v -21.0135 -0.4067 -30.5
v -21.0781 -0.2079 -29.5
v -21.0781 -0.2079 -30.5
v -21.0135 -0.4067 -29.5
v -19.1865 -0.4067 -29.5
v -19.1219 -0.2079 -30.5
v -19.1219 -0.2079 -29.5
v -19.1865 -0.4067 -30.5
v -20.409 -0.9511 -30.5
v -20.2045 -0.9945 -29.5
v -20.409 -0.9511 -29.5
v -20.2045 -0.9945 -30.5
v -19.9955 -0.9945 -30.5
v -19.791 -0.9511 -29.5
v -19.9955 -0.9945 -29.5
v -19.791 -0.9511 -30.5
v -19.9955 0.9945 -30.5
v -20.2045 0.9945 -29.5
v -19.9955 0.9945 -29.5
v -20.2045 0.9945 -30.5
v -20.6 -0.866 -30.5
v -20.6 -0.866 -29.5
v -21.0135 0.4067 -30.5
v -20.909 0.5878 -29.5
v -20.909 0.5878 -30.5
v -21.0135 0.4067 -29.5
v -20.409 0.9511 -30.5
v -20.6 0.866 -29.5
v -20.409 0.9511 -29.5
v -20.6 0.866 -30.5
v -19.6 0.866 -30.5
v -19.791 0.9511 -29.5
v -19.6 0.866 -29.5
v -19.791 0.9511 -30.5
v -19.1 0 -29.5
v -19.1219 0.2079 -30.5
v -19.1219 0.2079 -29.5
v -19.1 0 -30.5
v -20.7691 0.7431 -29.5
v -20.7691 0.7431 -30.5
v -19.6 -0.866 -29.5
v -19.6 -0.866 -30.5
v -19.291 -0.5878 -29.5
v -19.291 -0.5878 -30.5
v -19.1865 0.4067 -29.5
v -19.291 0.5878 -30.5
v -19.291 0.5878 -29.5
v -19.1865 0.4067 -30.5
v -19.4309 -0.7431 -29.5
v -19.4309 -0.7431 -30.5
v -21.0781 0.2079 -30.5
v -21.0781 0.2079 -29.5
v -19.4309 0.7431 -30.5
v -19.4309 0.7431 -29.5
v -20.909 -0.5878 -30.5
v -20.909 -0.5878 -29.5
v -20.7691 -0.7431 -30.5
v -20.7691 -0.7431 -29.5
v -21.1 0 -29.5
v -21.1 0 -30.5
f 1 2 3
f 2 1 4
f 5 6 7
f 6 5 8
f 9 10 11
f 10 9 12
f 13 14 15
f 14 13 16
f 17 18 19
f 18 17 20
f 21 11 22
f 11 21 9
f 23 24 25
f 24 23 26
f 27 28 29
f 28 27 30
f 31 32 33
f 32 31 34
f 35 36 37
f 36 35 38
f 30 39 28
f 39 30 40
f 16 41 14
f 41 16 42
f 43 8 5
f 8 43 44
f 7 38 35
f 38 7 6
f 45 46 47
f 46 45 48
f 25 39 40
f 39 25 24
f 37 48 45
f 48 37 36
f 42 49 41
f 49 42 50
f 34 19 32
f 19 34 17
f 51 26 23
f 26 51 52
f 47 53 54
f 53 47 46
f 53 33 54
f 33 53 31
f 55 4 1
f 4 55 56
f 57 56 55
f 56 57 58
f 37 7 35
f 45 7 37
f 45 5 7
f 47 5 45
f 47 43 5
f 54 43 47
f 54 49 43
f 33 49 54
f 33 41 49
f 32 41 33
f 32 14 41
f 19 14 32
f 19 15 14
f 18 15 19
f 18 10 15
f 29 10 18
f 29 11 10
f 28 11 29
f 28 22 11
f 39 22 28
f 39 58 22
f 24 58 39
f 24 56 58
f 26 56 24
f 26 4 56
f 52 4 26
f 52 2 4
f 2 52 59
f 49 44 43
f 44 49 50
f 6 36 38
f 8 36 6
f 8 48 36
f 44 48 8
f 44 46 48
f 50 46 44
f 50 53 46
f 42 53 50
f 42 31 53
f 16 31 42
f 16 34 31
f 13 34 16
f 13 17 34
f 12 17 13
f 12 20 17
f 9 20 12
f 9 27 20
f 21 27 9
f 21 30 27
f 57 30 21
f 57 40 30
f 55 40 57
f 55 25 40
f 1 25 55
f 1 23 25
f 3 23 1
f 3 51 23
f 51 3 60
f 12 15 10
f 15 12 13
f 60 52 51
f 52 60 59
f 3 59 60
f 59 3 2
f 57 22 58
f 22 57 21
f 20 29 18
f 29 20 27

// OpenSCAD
// file: IKEA Skadis v2 hook cutouts.scad
skadis_hook_width = 4.5;
skadis_hook_height = 46;
skadis_hole_spacing_width = 40; // middle to middle
cutout_tolerance_w = 0.4;
cutout_tolerance_h = 0.6;


module skadis_hook_cutout(center=false, hook_count=2) {
    
    if(center) {
        translate([-(skadis_hole_spacing_width + skadis_hook_width) / 2, 0, - skadis_hook_height / 2])
        object(hook_count);
    } else {
        object();
    }
    

}

module object(hook_count=2) {
    union() {

        // Cutout for the hook 1
        color("red")
        translate([- cutout_tolerance_w / 2, 0, - cutout_tolerance_h / 2])
        cube([skadis_hook_width + cutout_tolerance_w, 2, skadis_hook_height + cutout_tolerance_h]);

        // Cutout for the hook 2
        color("red")
        translate([- cutout_tolerance_w / 2 + skadis_hole_spacing_width, 0, - cutout_tolerance_h / 2])
        cube([skadis_hook_width + cutout_tolerance_w, 2, skadis_hook_height + cutout_tolerance_h]);

    }
}

skadis_hook_cutout(center = false);
// file: ../modules/roundedcube.scad
// More information: https://danielupshaw.com/openscad-rounded-corners/


// Examples
// color("Yellow")
// roundedcube(3, true, 0.7, "xmin");

// translate(v = [1, 0, 2])
// color("Pink")
// roundedcube([4, 2, 2], false, 0.6, "zmax");

// translate(v = [-4, -1, 2])
// color("Lightblue")
// roundedcube(2, false);

// translate(v = [0, 0, 6])
// color("Orange")
// roundedcube([3, 2, 2], true, 0.2);

// translate(v = [2.5, -0.5, 5])
// color("Green")
// roundedcube([3, 2, 2], false, 0.4, "z");

// Set to 0.01 for higher definition curves (renders slower)
$fs = 0.15;

module roundedcube(size = [1, 1, 1], center = false, radius = 0.5, apply_to = "all") {
	// If single value, convert to [x, y, z] vector
	size = (size[0] == undef) ? [size, size, size] : size;

	translate_min = radius;
	translate_xmax = size[0] - radius;
	translate_ymax = size[1] - radius;
	translate_zmax = size[2] - radius;

	diameter = radius * 2;

	obj_translate = (center == false) ?
		[0, 0, 0] : [
			-(size[0] / 2),
			-(size[1] / 2),
			-(size[2] / 2)
		];

	translate(v = obj_translate) {
		hull() {
			for (translate_x = [translate_min, translate_xmax]) {
				x_at = (translate_x == translate_min) ? "min" : "max";
				for (translate_y = [translate_min, translate_ymax]) {
					y_at = (translate_y == translate_min) ? "min" : "max";
					for (translate_z = [translate_min, translate_zmax]) {
						z_at = (translate_z == translate_min) ? "min" : "max";

						translate(v = [translate_x, translate_y, translate_z])
						if (
							(apply_to == "all") ||
							(apply_to == "xmin" && x_at == "min") || (apply_to == "xmax" && x_at == "max") ||
							(apply_to == "ymin" && y_at == "min") || (apply_to == "ymax" && y_at == "max") ||
							(apply_to == "zmin" && z_at == "min") || (apply_to == "zmax" && z_at == "max")
						) {
							sphere(r = radius);
						} else {
							rotate = 
								(apply_to == "xmin" || apply_to == "xmax" || apply_to == "x") ? [0, 90, 0] : (
								(apply_to == "ymin" || apply_to == "ymax" || apply_to == "y") ? [90, 90, 0] :
								[0, 0, 0]
							);
							rotate(a = rotate)
							cylinder(h = diameter, r = radius, center = true);
						}
					}
				}
			}
		}
	}
}
// main file
_width = 37 + 1.6 + 1.6;
_depth = 18 + 1.6 + 1.6;
_height = 60;
_thickness = 1.6;  //Recommended minimum 1.6

//use <./IKEA Skadis include backwall with 3 hooks.scad>
use <../modules/roundedcube.scad>
use <./IKEA Skadis v2 hook cutouts.scad>



module bin(_w, _d, _h, _t, _r) {

    difference() {
        translate([0, _d / 2, 0])
        difference() {
            roundedcube(size = [_w, _d, _h], center = true, radius = _r, apply_to = "z");
            color("red")
            translate([0, 0, _t])
            roundedcube(size = [_w - _t * 2, _d - _t * 2, _h - _t * 2 + 1], center = true, radius = _r, apply_to = "z");
        }
        color("green")
        translate([0, -1.4, 0])
        skadis_hook_cutout(center=true, 3);
    }
}

bin(_width, _depth, _height, _thickness);
